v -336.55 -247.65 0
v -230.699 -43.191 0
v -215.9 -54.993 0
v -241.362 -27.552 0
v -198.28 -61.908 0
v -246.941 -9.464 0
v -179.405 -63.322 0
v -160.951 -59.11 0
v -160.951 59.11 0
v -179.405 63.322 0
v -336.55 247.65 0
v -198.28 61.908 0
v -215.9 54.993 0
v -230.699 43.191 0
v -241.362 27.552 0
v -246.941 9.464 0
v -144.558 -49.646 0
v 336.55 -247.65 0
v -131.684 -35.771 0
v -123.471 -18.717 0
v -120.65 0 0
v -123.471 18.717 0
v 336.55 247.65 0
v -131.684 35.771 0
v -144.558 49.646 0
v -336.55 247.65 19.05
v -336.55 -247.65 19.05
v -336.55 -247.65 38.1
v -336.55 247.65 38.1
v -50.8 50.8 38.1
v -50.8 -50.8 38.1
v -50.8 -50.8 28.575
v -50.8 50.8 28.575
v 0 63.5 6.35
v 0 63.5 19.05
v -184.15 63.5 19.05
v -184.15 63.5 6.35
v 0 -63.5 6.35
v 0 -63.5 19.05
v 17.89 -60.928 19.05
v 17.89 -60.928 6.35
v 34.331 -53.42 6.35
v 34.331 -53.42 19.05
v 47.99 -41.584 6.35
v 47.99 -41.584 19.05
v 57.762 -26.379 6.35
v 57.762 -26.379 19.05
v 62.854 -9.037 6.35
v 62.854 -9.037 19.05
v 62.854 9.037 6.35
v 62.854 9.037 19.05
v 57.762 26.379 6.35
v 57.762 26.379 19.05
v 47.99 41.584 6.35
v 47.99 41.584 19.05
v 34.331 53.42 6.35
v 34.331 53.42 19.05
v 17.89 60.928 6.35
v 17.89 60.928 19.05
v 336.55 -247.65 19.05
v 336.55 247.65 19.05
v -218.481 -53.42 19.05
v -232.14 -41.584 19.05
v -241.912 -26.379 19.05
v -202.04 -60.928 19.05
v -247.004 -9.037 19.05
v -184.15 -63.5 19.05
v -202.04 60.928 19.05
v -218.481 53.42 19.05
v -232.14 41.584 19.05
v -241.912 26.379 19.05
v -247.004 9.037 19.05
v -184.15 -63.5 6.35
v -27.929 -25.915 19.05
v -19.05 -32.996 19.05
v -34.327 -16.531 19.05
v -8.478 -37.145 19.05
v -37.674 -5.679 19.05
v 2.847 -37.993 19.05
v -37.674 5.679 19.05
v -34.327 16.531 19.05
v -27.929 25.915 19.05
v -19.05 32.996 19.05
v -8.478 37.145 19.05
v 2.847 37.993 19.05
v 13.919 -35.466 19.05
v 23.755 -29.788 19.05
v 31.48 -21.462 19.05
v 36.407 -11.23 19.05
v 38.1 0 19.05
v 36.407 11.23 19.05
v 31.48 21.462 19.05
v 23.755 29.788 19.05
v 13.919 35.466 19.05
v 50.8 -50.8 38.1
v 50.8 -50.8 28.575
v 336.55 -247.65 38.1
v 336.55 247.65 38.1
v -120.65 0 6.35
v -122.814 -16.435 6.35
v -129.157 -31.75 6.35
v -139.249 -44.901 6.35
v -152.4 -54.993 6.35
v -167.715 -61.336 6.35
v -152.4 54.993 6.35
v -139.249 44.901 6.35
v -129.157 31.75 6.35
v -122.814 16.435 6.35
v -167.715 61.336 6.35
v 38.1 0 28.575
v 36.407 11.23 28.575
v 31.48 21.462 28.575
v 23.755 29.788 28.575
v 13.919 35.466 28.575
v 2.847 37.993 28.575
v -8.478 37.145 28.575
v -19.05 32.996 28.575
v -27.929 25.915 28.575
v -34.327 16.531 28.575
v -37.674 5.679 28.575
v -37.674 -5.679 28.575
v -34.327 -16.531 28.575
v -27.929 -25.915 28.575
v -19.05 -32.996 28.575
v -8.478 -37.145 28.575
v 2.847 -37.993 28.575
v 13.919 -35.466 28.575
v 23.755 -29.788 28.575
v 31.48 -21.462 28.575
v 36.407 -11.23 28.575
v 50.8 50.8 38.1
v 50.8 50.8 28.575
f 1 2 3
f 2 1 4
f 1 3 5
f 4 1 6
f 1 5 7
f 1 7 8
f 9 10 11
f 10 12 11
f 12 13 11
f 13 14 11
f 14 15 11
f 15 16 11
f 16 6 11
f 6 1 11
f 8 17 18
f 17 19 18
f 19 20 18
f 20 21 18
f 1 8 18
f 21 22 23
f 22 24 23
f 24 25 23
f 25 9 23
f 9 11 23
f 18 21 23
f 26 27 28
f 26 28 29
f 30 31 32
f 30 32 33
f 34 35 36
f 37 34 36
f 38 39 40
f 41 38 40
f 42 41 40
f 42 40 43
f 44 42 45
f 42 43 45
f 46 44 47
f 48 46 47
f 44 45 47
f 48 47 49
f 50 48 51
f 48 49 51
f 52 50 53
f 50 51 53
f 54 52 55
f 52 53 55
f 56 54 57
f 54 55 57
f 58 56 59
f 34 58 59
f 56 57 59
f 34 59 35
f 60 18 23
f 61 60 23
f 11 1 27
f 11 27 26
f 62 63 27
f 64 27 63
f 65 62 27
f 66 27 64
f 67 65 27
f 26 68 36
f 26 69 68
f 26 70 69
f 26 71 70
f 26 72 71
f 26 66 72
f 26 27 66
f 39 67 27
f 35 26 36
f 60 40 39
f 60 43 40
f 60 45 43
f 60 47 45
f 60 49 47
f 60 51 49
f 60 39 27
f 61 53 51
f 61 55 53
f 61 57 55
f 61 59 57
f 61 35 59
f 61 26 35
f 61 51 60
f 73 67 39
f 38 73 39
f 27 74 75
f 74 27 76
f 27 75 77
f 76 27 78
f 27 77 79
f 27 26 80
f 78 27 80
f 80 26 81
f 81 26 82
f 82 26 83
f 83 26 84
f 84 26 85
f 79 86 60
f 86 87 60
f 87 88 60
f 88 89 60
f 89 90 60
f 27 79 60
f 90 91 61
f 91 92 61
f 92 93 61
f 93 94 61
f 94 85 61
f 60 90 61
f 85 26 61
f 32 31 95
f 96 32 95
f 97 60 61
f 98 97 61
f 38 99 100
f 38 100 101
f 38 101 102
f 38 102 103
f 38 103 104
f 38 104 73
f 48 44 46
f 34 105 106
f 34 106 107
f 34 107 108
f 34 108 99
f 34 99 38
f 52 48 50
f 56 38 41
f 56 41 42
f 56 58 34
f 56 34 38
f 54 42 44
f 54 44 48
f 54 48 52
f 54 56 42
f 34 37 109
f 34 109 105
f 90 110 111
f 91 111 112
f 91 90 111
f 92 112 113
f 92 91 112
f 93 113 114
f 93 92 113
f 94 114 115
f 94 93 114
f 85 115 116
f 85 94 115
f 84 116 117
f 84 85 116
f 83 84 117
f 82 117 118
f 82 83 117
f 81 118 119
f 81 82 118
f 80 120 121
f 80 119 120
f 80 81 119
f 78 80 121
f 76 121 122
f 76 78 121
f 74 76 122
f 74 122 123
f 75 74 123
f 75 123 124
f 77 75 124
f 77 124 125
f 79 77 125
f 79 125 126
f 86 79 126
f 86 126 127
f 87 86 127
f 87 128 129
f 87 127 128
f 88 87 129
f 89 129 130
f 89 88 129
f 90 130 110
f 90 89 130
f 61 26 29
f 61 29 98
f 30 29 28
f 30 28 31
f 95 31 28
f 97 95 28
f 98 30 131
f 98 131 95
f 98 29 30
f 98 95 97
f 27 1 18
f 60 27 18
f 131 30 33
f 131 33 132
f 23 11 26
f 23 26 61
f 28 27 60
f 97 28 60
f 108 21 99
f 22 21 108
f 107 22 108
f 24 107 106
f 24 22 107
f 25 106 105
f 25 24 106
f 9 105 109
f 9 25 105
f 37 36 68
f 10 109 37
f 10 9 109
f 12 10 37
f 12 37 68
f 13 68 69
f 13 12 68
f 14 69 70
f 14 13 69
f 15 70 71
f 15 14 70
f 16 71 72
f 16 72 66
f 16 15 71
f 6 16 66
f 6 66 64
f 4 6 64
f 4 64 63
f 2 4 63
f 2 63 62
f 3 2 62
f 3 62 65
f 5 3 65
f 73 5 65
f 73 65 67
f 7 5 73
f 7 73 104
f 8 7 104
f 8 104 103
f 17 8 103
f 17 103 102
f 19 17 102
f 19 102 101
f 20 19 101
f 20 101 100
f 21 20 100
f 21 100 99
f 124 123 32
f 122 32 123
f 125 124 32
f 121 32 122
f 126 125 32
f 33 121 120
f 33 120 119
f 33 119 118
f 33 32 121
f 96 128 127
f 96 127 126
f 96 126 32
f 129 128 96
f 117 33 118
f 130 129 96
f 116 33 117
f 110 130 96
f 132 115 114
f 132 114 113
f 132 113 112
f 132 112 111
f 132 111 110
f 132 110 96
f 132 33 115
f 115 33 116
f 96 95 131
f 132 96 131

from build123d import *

# Parameters (mm, degrees)
F0_W     = 673.1
F0_H     = 495.3
F0_R     = 63.5
F1_DEPTH = 19.05
F3_DEPTH = 12.7
F4_W     = 673.1
F4_H     = 495.3
F4_R     = 38.1
F5_DEPTH = 19.05
F6_W     = 101.6
F6_H     = 101.6
F7_DEPTH = 9.525


with BuildPart() as f1:
    # F0 (on Top) → F1 (new body)
    with BuildSketch(Plane.XY):
        Rectangle(F0_W, F0_H)
        with Locations((-184.15, 0)):
            Circle(F0_R, mode=Mode.SUBTRACT)
    extrude(amount=F1_DEPTH)

    # F2 (on face) → F3 (cut)
    with BuildSketch(Plane.XY.offset(19.05)):
        with BuildLine():
            Line((-184.15, -63.5), (0, -63.5))
            ThreePointArc((0, -63.5), (63.5, 0), (0, 63.5))
            Line((0, 63.5), (-184.15, 63.5))
            ThreePointArc((-184.15, 63.5), (-247.65, 0), (-184.15, -63.5))
        make_face()
    extrude(amount=-F3_DEPTH, mode=Mode.SUBTRACT)


with BuildPart() as f5:
    # F4 (on face) → F5 (new body)
    with BuildSketch(Plane.XY.offset(19.05)):
        Rectangle(F4_W, F4_H)
        Circle(F4_R, mode=Mode.SUBTRACT)
    extrude(amount=F5_DEPTH)

    # F6 (on face) → F7 (cut)
    with BuildSketch(Plane.XY.offset(38.1)):
        Rectangle(F6_W, F6_H)
    extrude(amount=-F7_DEPTH, mode=Mode.SUBTRACT)


solid = Compound([f1.part, f5.part])
